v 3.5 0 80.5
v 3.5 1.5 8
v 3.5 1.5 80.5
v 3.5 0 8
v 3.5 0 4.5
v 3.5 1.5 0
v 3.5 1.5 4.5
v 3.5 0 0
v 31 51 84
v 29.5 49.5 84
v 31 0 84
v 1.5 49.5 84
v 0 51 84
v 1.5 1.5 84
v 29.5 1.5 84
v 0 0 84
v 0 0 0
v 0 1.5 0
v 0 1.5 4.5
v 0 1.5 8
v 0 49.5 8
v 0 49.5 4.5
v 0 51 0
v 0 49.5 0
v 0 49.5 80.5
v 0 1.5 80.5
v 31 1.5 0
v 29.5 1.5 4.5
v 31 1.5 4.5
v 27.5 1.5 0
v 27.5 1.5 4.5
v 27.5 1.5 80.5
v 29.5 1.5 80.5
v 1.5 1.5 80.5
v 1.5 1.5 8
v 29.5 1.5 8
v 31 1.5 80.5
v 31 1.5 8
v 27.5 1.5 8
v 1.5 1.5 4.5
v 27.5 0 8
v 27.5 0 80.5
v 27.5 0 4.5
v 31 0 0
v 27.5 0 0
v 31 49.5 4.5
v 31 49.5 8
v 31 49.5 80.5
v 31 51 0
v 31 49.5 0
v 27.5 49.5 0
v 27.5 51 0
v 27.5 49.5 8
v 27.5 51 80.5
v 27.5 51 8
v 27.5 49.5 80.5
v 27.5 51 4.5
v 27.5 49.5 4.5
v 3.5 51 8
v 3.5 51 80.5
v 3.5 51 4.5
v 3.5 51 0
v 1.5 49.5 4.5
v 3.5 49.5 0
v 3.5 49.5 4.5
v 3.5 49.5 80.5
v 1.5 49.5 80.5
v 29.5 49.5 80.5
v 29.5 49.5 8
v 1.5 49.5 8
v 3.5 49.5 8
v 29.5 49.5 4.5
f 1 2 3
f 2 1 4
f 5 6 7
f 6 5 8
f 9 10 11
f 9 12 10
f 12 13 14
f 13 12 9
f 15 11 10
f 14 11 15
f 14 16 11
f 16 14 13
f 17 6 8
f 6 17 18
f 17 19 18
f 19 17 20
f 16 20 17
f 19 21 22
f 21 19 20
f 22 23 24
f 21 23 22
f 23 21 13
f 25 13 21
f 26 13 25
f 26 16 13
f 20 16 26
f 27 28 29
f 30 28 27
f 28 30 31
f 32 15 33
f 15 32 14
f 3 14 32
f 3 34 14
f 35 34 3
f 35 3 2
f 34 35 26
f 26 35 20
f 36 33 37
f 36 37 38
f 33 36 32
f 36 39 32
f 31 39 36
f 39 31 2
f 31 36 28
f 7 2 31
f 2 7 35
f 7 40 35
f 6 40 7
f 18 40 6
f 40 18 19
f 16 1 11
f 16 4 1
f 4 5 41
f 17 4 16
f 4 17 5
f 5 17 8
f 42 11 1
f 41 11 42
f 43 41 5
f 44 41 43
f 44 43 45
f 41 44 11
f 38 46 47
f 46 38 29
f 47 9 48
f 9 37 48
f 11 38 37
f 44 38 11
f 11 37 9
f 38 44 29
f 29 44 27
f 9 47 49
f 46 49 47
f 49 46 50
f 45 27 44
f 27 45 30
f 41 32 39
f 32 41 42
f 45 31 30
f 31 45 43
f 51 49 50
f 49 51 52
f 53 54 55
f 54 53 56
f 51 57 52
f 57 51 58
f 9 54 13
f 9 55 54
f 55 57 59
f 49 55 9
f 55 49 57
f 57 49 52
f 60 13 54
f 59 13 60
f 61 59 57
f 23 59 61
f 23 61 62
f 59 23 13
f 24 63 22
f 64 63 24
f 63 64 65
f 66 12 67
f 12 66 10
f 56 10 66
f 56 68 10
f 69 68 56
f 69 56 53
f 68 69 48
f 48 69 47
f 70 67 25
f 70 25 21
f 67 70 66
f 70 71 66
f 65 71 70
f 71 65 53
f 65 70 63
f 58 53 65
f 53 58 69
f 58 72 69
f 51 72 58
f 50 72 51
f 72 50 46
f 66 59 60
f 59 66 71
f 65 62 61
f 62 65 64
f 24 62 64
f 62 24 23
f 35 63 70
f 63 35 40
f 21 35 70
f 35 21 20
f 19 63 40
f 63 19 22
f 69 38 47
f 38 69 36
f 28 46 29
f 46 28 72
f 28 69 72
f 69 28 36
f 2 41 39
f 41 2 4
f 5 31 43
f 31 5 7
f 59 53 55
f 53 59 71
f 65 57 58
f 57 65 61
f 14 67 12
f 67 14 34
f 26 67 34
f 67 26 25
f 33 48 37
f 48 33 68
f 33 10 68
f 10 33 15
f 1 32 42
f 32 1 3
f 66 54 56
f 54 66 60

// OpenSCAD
module  StrongTie_cube(height=60,width=48, depth=24, top_level=60, bottom_level=6)
{
    post_w = 3.5;
    post_h = 1.5;
    post_l=height;

    light_l = width;
    light_w = depth;
    light_th = 0.25;

    bottom_l=width;
    bottom_w=depth;
    bottom_th = .75;

    top_b = top_level-post_w; // plane of top frame.
    bottom_b=bottom_level-post_h;

    // posts
    translate([0,0,0]) 
        cube([post_w,post_h,post_l]);
    translate([light_w+post_w,0,0]) 
        cube([post_w,post_h,post_l]);
    translate([light_w+post_w,light_l+post_h,0]) 
        cube([post_w,post_h,post_l]);
    translate([0,light_l+post_h,0])
        cube([post_w,post_h,post_l]);
        


    // bottom_frame
    translate([0,post_h,bottom_b]) 
        cube([post_h,light_l,post_w]);
    translate([light_w+((2*post_w)-post_h),post_h,bottom_b]) 
        cube([post_h,light_l,post_w]);
    translate([post_w,0,bottom_b])  
        cube([light_w,post_h,post_w]);
    translate([post_w,light_l+post_h,bottom_b])  
        cube([light_w,post_h,post_w]);
    // top_frame
    translate([0,post_h,top_b]) 
        cube([post_h,light_l,post_w]);
    translate([light_w+((2*post_w)-post_h),post_h,top_b])
       cube([post_h,light_l,post_w]);
    translate([post_w,0,top_b])  
        cube([light_w,post_h,post_w]);
    translate([post_w,light_l+post_h,top_b])  
        cube([light_w,post_h,post_w]);
        
}

// StrongTie_cube(36,36,16,36,6); // Brian's table frame
 StrongTie_cube(84,48,24,84,6); // Grow Station Frame 
